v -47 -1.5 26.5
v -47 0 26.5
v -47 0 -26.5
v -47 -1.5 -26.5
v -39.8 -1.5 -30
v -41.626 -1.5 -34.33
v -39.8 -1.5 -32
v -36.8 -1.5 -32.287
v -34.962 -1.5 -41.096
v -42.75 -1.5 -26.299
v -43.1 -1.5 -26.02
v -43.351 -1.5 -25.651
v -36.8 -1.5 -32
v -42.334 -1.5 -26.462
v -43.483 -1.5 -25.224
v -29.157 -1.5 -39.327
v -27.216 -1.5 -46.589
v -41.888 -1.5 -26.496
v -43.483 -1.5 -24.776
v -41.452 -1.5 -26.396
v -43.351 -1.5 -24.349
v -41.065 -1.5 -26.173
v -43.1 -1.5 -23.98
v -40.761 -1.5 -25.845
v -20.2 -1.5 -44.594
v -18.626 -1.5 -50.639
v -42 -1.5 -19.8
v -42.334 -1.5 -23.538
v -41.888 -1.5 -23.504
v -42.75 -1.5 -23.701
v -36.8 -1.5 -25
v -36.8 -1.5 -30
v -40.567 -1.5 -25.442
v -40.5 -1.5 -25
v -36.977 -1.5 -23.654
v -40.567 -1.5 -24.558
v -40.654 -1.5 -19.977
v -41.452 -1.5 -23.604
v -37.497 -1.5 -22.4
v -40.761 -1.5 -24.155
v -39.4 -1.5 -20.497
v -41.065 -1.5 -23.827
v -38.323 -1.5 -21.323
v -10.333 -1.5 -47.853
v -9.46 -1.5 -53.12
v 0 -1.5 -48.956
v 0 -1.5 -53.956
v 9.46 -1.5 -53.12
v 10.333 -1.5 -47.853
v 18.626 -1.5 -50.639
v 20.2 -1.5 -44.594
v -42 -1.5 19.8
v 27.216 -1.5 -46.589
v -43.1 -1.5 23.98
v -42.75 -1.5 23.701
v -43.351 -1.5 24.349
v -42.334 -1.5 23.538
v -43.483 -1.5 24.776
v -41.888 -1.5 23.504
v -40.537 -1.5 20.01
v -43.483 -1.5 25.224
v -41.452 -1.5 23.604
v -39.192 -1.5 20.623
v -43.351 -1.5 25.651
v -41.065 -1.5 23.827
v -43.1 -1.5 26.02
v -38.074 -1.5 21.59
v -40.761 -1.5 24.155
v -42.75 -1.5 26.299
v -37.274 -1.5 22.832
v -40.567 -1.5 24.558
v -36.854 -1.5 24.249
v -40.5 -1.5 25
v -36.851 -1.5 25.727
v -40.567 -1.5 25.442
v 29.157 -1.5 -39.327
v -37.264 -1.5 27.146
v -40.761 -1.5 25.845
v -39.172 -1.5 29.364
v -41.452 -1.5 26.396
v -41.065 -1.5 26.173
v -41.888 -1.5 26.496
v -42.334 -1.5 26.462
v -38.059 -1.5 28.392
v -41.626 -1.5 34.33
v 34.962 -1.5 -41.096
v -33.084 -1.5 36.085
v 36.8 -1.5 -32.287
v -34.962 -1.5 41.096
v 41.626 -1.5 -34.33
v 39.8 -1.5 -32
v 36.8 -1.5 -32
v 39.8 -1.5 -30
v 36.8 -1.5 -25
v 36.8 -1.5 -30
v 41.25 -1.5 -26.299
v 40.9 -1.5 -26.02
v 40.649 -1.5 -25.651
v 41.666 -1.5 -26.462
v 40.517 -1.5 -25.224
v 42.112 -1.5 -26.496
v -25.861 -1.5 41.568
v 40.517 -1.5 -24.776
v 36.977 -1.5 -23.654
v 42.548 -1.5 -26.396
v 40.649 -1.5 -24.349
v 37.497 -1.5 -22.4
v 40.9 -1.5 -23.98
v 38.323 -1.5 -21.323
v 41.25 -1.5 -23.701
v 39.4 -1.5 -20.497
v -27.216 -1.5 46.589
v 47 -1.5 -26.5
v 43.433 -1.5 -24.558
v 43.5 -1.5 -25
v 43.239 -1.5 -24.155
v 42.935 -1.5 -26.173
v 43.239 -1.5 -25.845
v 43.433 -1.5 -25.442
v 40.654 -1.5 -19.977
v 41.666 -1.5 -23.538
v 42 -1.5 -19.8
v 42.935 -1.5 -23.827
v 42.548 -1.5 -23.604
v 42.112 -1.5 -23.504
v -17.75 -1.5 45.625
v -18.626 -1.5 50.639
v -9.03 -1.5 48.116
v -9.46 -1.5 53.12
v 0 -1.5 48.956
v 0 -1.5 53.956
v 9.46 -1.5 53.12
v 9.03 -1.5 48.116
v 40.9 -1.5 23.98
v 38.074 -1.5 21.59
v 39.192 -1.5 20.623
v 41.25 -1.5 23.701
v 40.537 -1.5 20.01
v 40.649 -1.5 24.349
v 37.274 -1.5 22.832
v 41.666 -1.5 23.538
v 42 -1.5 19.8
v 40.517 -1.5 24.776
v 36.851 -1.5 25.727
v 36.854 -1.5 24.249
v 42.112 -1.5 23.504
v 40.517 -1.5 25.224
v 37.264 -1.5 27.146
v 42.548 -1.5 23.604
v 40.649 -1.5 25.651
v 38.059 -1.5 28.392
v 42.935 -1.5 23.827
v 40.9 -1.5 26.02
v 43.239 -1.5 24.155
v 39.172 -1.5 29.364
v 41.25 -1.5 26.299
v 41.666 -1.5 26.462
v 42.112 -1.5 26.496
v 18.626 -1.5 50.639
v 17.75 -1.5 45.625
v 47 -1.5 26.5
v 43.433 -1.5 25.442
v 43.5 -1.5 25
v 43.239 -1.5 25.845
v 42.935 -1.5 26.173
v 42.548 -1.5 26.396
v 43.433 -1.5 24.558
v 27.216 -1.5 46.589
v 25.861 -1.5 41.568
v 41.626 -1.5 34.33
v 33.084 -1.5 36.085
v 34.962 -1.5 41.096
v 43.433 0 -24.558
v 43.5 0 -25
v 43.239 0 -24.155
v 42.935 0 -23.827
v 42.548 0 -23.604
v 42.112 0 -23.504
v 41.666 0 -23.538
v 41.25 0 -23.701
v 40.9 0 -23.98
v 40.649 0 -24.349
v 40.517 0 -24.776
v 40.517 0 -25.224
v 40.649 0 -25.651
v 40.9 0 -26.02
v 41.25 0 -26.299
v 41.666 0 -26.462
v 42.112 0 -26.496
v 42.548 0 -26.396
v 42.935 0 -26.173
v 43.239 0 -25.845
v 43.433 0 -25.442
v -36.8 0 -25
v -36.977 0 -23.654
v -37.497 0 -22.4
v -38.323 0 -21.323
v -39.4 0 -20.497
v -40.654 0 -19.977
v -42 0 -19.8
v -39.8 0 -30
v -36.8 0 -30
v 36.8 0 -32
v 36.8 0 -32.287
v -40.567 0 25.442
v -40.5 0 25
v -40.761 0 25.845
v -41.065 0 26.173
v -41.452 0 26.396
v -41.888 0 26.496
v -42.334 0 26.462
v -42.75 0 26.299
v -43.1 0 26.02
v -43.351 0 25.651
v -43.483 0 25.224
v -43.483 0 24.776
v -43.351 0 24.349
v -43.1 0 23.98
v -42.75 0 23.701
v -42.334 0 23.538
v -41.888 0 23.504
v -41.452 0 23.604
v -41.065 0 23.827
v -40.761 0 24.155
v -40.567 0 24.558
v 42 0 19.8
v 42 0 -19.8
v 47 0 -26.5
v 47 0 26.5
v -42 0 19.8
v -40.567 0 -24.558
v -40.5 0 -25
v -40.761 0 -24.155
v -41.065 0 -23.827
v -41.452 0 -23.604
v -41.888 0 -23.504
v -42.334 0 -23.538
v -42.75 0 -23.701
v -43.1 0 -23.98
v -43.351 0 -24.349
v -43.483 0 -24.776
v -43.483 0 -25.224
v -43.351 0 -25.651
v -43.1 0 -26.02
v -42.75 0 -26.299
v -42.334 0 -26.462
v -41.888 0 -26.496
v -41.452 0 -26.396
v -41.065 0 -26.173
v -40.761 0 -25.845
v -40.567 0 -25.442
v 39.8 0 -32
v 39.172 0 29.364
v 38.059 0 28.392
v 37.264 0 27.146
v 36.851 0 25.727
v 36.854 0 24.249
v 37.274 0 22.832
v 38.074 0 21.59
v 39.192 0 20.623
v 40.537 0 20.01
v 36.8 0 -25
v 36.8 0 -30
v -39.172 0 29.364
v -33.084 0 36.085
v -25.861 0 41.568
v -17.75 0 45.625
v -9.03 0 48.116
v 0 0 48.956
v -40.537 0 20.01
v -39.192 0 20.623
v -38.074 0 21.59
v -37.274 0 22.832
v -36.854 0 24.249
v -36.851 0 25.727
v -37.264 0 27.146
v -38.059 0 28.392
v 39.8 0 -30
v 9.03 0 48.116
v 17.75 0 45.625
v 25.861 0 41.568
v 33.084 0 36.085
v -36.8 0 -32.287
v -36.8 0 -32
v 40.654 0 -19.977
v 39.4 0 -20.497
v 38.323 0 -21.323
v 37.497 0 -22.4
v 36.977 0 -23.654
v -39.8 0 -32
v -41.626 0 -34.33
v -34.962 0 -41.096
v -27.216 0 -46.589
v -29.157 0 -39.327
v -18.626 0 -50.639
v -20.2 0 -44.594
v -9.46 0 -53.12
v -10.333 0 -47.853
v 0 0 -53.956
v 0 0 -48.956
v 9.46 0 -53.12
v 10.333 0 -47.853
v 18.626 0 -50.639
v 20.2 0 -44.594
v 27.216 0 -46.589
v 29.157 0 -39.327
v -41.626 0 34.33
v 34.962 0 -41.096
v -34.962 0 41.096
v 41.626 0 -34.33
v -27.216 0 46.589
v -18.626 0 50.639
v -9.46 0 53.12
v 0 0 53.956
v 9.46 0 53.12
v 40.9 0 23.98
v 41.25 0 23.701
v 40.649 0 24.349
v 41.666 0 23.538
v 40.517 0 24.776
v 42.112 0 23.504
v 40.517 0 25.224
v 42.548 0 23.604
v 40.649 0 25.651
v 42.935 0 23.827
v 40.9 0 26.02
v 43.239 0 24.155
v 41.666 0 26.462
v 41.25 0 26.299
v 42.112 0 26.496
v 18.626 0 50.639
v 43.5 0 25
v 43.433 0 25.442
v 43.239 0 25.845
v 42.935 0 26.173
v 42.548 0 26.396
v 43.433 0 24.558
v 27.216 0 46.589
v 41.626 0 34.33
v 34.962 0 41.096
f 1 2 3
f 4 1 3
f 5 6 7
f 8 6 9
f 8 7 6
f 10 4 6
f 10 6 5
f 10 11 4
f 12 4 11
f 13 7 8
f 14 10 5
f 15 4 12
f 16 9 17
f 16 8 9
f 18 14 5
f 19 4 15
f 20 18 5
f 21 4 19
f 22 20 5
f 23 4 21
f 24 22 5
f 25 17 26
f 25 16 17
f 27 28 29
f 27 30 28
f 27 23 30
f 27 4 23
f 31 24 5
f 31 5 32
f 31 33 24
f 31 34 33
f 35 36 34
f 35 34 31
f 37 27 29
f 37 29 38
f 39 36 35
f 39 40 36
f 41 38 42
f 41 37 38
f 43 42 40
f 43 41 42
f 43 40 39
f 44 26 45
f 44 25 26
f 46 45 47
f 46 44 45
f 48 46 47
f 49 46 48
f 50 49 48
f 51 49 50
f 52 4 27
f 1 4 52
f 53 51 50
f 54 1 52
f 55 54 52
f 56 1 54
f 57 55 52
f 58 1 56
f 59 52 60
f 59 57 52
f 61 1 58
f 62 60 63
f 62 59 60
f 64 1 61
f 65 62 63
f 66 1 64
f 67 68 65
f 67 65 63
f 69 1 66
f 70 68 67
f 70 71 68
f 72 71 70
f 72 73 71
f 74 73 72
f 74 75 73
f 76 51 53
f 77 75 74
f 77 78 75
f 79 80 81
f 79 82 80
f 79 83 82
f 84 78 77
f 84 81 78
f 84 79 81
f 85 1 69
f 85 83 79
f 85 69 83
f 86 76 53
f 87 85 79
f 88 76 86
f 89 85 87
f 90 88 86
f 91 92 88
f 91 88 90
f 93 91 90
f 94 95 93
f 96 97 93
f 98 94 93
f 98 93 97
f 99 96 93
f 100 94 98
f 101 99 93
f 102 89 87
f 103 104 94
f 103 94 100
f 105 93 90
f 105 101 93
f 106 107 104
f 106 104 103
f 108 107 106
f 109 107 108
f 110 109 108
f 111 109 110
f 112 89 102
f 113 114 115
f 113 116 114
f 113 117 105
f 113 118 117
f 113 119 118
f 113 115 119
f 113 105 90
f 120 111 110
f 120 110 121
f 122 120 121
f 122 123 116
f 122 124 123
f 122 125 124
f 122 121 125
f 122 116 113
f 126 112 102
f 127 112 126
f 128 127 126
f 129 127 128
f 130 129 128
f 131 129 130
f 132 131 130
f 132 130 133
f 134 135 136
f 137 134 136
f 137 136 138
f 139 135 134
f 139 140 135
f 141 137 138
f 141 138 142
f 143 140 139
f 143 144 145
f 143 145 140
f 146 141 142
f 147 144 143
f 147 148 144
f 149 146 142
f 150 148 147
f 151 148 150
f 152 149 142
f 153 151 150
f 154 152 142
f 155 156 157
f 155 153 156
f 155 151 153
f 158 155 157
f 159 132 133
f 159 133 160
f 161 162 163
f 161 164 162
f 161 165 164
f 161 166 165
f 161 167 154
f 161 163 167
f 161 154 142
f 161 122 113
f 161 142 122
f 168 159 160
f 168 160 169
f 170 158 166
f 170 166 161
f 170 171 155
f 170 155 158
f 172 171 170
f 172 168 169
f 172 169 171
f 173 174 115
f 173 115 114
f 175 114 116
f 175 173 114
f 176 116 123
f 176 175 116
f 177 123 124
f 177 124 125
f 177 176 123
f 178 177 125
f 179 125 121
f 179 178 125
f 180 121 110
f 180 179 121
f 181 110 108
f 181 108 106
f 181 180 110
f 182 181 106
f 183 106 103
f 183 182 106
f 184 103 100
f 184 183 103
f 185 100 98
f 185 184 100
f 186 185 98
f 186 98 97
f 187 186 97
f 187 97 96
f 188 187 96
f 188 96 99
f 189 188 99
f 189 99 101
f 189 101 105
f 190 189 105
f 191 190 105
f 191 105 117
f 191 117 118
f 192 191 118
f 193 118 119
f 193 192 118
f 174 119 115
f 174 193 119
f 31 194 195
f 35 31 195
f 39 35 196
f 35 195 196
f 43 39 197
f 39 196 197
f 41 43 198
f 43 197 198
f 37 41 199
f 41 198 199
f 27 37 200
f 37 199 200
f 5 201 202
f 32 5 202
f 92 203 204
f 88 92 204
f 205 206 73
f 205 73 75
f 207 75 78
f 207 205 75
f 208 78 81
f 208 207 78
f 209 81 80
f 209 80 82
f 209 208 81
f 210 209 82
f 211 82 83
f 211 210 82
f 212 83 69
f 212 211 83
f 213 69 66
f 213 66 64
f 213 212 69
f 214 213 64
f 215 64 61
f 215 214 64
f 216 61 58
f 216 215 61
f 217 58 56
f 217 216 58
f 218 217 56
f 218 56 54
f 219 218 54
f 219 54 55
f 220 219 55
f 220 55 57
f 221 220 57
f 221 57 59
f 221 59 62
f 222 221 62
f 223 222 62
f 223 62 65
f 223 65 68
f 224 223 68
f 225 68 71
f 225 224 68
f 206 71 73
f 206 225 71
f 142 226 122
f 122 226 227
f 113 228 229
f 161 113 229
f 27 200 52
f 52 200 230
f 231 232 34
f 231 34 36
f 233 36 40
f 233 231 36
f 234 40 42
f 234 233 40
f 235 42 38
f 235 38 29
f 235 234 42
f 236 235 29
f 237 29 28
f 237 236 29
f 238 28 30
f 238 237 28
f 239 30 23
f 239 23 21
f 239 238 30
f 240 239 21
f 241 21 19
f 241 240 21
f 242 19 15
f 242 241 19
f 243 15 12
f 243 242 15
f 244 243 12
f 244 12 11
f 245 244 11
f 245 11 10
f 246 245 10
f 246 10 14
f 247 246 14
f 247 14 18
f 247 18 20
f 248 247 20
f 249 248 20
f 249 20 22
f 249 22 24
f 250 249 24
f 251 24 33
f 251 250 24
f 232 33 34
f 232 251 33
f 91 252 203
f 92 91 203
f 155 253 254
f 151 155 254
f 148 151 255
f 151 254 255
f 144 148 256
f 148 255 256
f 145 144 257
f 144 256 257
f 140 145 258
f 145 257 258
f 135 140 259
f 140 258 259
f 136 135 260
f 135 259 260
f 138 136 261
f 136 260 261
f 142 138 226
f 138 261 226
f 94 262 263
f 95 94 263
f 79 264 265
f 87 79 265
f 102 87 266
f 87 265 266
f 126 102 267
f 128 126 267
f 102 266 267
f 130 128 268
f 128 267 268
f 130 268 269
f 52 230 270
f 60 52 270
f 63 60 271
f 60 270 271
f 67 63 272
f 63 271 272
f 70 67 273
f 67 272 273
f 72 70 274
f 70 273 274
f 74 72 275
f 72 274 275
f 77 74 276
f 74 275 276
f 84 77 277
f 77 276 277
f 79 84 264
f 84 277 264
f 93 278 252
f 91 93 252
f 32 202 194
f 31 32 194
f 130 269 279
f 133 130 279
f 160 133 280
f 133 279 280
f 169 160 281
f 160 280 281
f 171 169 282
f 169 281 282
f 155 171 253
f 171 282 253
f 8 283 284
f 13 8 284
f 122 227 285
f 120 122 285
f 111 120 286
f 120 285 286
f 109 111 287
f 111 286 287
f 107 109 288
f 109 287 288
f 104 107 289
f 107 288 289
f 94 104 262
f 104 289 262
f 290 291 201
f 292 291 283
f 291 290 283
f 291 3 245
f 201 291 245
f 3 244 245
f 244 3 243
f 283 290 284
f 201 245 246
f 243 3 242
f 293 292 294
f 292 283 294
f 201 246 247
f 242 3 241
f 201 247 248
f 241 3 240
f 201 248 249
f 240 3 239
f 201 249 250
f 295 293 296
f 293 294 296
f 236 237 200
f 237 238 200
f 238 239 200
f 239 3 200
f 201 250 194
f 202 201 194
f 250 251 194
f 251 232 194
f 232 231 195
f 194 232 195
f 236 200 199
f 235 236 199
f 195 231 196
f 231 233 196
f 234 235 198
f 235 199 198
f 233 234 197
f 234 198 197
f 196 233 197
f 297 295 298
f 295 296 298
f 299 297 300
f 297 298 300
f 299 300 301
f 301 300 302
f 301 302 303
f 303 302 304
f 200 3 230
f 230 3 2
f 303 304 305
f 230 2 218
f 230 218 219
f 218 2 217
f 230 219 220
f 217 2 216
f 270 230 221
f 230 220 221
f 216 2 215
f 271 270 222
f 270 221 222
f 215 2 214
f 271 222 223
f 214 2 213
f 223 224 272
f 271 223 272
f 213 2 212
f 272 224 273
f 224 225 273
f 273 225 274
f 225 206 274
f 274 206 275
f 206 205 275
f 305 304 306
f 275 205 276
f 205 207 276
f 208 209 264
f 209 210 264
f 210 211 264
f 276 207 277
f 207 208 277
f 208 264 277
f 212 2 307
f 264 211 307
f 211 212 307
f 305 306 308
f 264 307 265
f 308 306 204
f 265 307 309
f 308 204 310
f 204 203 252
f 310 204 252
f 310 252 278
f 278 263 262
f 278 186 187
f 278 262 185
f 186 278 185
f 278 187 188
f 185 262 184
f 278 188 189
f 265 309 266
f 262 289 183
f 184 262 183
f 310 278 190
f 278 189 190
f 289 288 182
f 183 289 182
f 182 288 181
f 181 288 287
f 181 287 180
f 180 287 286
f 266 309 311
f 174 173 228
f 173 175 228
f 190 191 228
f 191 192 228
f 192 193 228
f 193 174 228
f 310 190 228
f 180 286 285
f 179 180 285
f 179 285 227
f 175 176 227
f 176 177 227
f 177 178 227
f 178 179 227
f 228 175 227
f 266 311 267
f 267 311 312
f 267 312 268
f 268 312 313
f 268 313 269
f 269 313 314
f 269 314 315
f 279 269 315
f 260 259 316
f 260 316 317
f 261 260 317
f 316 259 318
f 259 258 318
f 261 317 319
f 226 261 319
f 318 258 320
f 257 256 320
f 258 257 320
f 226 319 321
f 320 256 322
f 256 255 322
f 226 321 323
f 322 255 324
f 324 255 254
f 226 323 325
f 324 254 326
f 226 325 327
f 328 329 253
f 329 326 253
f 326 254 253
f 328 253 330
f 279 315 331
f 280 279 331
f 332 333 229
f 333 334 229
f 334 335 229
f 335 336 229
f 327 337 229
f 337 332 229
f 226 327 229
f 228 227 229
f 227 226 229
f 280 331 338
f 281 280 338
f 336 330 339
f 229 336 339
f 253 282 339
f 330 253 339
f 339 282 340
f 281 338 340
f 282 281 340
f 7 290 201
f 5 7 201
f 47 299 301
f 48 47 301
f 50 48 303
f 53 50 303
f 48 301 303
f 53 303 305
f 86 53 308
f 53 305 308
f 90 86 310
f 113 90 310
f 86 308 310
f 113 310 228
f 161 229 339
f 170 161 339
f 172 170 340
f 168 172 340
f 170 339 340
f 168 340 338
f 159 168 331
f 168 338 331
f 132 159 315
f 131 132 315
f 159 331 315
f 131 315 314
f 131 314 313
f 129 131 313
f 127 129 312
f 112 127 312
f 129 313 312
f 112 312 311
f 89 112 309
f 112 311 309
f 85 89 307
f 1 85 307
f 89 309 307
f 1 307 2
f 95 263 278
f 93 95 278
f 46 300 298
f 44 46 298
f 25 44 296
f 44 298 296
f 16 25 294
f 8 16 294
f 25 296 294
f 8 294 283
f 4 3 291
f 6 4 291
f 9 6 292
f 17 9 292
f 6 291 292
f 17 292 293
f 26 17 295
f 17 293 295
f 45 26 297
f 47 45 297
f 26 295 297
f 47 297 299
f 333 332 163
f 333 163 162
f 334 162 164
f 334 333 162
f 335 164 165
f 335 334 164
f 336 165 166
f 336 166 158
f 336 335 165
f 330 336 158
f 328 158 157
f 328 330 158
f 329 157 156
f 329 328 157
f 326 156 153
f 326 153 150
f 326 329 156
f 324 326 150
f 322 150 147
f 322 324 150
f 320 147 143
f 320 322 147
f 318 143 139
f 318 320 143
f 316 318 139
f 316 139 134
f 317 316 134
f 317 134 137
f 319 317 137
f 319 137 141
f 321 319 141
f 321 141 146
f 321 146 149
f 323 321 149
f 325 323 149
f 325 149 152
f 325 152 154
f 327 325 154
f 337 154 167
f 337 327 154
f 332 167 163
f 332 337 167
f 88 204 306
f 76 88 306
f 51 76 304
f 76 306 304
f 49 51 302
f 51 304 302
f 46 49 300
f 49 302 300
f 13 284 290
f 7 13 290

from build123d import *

# Parameters (mm, degrees)
F0_R     = 1.5
F1_DEPTH = 1.5


with BuildPart() as f1:
    # F0 (on Front) → F1 (new body)
    with BuildSketch(Plane.XZ):
        with BuildLine():
            ThreePointArc((0, 53.956001), (-27.215951, 46.589076), (-47, 26.5))
            Line((-47, 26.5), (-47, -26.5))
            ThreePointArc((-47, -26.5), (-27.215951, -46.589076), (0, -53.956001))
            ThreePointArc((0, -53.956001), (27.215951, -46.589076), (47, -26.5))
            Line((47, -26.5), (47, 26.5))
            ThreePointArc((47, 26.5), (27.215951, 46.589076), (0, 53.956001))
        make_face()
        with Locations((-42, -25)):
            Circle(F0_R, mode=Mode.SUBTRACT)
        with Locations((42, -25)):
            Circle(F0_R, mode=Mode.SUBTRACT)
        with Locations((-42, 25)):
            Circle(F0_R, mode=Mode.SUBTRACT)
        with BuildLine():
            ThreePointArc((-42, 19.8), (-37.01342, 23.525544), (-39.172119, 29.363839))
            ThreePointArc((-39.172119, 29.363839), (-21.899245, 43.784849), (0, 48.956))
            ThreePointArc((0, 48.956), (21.899245, 43.784849), (39.172119, 29.363839))
            ThreePointArc((39.172119, 29.363839), (37.01342, 23.525544), (42, 19.8))
            Line((42, 19.8), (42, -19.8))
            ThreePointArc((42, -19.8), (38.323045, -21.323045), (36.8, -25))
            Line((36.8, -25), (36.8, -30))
            Line((36.8, -30), (39.8, -30))
            Line((39.8, -30), (39.8, -32))
            Line((39.8, -32), (37.04983, -32))
            Line((37.04983, -32), (36.8, -32))
            Line((36.8, -32), (36.8, -32.286993))
            ThreePointArc((36.8, -32.286993), (20.199603, -44.594461), (0, -48.956))
            ThreePointArc((0, -48.956), (-20.199603, -44.594461), (-36.8, -32.286993))
            Line((-36.8, -32.286993), (-36.8, -32))
            Line((-36.8, -32), (-37.04983, -32))
            Line((-37.04983, -32), (-39.8, -32))
            Line((-39.8, -32), (-39.8, -30))
            Line((-39.8, -30), (-36.8, -30))
            Line((-36.8, -30), (-36.8, -25))
            ThreePointArc((-36.8, -25), (-38.323045, -21.323045), (-42, -19.8))
            Line((-42, -19.8), (-42, 19.8))
        make_face(mode=Mode.SUBTRACT)
        with Locations((42, 25)):
            Circle(F0_R, mode=Mode.SUBTRACT)
    extrude(amount=F1_DEPTH)


solid = f1.part
